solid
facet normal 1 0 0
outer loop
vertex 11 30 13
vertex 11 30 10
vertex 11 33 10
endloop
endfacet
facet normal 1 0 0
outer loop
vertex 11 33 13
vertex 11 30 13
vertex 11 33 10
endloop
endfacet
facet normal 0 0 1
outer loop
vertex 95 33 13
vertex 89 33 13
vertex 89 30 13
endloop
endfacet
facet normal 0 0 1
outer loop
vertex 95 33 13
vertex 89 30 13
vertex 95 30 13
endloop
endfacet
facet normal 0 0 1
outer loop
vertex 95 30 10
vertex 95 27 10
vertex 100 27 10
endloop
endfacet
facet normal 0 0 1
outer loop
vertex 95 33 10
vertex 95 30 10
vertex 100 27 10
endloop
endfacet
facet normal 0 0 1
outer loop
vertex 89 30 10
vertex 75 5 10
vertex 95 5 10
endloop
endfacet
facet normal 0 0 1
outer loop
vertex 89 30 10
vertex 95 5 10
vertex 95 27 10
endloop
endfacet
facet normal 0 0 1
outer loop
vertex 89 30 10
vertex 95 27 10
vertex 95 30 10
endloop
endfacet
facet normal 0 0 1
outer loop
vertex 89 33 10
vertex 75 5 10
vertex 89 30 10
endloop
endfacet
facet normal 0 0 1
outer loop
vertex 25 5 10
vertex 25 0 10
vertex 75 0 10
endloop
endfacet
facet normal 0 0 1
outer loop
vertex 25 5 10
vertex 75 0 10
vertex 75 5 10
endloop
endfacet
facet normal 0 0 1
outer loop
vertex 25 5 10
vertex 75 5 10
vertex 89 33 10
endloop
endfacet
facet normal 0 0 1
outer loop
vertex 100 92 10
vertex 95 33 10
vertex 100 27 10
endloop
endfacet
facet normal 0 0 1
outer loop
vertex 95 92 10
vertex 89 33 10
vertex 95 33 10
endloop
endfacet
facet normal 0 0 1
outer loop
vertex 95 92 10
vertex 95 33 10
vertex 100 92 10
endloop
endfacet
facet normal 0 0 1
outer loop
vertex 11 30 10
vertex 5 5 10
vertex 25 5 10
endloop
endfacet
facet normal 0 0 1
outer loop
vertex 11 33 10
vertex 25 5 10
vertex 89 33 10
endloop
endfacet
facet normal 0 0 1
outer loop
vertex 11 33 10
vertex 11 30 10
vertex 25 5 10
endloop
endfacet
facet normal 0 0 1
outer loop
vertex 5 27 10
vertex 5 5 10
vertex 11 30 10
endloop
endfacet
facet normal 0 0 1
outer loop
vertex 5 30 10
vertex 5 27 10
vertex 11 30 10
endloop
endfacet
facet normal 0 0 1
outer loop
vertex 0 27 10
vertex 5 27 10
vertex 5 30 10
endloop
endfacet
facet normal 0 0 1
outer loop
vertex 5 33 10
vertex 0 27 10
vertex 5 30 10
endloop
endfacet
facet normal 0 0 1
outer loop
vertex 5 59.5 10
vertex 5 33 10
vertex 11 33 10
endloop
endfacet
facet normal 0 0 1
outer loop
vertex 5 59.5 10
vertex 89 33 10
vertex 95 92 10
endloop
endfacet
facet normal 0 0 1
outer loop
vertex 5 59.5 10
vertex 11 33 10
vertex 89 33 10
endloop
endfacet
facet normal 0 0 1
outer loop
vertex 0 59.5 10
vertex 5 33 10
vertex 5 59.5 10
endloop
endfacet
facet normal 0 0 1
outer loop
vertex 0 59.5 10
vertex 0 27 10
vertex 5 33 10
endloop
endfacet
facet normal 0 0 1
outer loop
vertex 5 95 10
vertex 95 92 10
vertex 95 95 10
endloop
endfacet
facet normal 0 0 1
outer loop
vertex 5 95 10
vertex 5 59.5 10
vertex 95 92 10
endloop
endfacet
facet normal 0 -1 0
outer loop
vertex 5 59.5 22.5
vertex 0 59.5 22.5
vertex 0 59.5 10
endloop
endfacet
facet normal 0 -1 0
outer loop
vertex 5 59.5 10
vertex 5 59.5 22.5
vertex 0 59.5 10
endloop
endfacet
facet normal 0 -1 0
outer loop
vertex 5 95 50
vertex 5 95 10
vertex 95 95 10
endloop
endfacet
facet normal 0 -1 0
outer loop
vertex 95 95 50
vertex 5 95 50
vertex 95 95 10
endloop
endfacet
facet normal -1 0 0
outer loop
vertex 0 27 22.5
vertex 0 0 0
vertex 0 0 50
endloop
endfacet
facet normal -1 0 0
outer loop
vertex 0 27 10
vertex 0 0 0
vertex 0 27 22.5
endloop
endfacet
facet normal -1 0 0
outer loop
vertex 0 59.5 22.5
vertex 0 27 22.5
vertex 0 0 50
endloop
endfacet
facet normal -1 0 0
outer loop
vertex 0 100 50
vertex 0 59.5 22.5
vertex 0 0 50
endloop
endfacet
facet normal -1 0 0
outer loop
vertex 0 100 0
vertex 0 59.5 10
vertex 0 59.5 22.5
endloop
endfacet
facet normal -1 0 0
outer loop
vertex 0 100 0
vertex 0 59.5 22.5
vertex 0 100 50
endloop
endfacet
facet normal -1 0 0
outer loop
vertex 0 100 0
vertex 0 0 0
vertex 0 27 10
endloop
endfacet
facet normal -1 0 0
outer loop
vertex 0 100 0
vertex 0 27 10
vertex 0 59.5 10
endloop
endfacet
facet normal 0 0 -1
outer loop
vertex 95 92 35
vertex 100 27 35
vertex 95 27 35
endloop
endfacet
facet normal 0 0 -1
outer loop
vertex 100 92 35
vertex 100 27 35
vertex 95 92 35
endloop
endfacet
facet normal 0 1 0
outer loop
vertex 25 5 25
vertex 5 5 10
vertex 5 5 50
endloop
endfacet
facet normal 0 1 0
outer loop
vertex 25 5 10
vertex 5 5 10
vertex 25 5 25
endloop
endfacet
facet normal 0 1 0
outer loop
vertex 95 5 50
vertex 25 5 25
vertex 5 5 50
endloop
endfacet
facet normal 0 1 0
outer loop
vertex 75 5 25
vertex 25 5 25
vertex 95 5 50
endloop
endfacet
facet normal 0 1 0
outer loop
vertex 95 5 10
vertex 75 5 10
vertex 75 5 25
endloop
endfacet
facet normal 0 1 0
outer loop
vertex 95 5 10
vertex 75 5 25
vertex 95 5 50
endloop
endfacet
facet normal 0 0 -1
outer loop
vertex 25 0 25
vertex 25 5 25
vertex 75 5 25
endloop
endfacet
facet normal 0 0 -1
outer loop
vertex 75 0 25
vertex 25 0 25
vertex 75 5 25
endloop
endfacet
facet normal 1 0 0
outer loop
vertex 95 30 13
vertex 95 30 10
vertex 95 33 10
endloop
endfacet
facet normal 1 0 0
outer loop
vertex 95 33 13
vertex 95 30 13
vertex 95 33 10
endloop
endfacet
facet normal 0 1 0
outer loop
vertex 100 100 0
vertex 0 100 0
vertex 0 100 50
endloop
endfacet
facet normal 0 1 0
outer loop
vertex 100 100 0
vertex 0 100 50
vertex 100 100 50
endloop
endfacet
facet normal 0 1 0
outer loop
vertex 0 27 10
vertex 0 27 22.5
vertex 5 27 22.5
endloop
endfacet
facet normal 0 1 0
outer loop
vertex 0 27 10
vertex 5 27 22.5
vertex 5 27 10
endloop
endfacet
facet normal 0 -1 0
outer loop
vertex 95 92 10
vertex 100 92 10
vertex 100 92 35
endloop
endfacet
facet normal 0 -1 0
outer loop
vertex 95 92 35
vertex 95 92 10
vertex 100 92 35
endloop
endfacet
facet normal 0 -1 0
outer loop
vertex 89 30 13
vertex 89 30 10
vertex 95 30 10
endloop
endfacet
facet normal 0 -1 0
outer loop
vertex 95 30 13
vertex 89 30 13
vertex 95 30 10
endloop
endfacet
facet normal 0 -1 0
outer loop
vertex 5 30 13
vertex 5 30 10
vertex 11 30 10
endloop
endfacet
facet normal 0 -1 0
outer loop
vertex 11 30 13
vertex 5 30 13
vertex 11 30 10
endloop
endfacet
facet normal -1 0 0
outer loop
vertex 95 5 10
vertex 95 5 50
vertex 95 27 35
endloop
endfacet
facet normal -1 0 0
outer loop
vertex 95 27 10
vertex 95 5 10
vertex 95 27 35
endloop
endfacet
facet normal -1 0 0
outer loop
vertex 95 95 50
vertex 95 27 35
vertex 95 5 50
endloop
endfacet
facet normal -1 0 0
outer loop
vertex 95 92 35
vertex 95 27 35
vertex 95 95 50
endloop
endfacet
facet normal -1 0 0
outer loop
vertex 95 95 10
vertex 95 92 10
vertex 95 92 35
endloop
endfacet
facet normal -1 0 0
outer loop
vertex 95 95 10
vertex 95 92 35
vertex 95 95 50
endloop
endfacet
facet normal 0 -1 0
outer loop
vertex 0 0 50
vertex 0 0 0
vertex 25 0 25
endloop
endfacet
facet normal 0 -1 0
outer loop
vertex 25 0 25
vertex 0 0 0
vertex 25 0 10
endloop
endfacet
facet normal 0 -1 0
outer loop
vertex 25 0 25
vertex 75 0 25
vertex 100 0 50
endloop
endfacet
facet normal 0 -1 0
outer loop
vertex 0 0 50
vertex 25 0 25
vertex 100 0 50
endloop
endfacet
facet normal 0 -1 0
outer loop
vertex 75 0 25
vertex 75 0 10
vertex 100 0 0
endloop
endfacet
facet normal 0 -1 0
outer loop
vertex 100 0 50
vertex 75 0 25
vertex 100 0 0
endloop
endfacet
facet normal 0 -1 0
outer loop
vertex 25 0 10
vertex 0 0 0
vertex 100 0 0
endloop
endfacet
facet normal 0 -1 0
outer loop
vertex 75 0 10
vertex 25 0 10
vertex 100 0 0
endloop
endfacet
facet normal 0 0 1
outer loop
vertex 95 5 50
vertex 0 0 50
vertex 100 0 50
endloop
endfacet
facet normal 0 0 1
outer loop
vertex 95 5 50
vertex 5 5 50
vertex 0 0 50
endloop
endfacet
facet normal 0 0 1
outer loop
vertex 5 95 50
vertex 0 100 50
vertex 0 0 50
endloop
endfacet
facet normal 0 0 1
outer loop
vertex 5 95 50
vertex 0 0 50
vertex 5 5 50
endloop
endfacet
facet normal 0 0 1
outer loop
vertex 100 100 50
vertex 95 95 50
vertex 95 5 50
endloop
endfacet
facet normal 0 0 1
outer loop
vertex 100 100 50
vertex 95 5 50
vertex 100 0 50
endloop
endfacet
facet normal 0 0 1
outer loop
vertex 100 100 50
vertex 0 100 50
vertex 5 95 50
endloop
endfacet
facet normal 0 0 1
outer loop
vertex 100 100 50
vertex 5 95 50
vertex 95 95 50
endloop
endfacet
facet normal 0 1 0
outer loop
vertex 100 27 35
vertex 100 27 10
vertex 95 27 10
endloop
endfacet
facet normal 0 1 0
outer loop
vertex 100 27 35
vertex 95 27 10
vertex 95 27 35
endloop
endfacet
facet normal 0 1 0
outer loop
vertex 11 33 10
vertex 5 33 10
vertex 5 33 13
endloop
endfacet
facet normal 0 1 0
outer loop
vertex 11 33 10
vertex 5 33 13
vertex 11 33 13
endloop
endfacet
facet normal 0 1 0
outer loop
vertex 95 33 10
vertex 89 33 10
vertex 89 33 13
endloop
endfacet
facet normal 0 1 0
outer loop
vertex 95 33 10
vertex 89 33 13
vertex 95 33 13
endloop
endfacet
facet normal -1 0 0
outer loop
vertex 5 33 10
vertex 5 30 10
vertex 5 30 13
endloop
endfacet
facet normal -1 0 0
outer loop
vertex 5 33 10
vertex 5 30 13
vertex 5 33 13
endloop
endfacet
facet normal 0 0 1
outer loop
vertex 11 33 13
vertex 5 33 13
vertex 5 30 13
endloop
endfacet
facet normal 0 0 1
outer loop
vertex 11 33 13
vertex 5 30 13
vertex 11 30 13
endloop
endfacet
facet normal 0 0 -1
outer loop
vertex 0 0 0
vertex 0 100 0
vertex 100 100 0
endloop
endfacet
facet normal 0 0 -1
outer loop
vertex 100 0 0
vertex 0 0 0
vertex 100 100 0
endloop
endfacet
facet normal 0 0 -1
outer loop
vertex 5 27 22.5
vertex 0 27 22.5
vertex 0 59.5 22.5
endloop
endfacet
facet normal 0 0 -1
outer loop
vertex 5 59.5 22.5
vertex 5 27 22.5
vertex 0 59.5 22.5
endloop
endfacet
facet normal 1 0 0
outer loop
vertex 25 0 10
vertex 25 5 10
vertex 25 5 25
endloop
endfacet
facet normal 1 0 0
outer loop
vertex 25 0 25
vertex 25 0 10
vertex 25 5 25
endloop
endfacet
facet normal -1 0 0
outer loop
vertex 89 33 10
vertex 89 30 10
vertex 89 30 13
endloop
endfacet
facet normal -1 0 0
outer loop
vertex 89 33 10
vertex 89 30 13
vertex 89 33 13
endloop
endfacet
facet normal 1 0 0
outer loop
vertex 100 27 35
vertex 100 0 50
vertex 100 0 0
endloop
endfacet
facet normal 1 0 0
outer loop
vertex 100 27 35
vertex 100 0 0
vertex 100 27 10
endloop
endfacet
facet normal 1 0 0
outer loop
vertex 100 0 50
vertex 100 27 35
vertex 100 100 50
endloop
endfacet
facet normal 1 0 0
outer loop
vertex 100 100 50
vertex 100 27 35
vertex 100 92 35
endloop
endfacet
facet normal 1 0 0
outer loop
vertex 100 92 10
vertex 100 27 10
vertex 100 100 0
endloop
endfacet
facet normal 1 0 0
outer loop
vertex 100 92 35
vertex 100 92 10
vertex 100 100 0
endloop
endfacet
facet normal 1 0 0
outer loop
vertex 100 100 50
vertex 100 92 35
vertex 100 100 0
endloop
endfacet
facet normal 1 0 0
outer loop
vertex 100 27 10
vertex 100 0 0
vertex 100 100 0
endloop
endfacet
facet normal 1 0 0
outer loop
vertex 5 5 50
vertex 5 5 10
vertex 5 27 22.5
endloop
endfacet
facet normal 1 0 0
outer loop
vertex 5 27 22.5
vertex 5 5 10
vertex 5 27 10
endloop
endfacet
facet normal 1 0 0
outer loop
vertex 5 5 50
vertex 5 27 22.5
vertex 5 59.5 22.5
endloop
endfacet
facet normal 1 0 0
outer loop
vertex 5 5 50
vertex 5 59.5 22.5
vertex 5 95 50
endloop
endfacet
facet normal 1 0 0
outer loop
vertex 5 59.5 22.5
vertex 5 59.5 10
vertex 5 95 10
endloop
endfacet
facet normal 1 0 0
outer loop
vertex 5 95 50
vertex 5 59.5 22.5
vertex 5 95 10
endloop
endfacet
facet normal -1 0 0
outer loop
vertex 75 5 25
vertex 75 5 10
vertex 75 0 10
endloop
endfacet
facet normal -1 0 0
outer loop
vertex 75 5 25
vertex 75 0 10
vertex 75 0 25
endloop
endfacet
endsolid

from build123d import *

# Parameters (mm, degrees)
SKETCH1_W               = 100
SKETCH1_H               = 100
BOSS_EXTRUDE1_DEPTH     = 50
SHELL1_T                = -10
CUT_EXTRUDE1_DEPTH      = 151
CUT_EXTRUDE1_DEPTH_BACK = 10
SKETCH2_W               = 50
SKETCH2_H               = 15
SKETCH3_W               = 25
SKETCH3_H               = 65
CUT_EXTRUDE2_DEPTH      = 10
SKETCH4_W               = 12.5
SKETCH4_H               = 32.5
CUT_EXTRUDE3_DEPTH      = 10
CUT_EXTRUDE4_START      = -40
SKETCH5_W               = 90
SKETCH5_H               = 90
CUT_EXTRUDE4_DEPTH      = 40
SKETCH6_W               = 6
SKETCH6_H               = 3
BOSS_EXTRUDE2_DEPTH     = 3


with BuildPart() as part:
    # Sketch1 → Boss-Extrude1 (new body)
    with BuildSketch(Plane.XY):
        with Locations((50, 50)):
            Rectangle(SKETCH1_W, SKETCH1_H)
    extrude(amount=BOSS_EXTRUDE1_DEPTH)

    # Shell1
    shell1_openings = [part.faces().sort_by_distance(p)[0] for p in [
        (50, 50, 50),
    ]]
    offset(amount=SHELL1_T, openings=shell1_openings, kind=Kind.INTERSECTION)

    # Sketch2 → Cut-Extrude1 (cut, two sides: drawn at the far end of the back side and taken through both)
    with BuildSketch(Plane.XZ.offset(-CUT_EXTRUDE1_DEPTH_BACK)):
        with Locations((50, 17.5)):
            Rectangle(SKETCH2_W, SKETCH2_H)
    extrude(amount=CUT_EXTRUDE1_DEPTH + CUT_EXTRUDE1_DEPTH_BACK, mode=Mode.SUBTRACT)

    # Sketch3 → Cut-Extrude2 (cut)
    with BuildSketch(Plane.ZY.offset(-100)):
        with Locations((22.5, 59.5)):
            Rectangle(SKETCH3_W, SKETCH3_H)
    extrude(amount=CUT_EXTRUDE2_DEPTH, mode=Mode.SUBTRACT)

    # Sketch4 → Cut-Extrude3 (cut)
    with BuildSketch(Plane(origin=(0, 0, 0), x_dir=(0, 0, -1), z_dir=(1, 0, 0))):
        with Locations((-16.25, 43.25)):
            Rectangle(SKETCH4_W, SKETCH4_H)
    extrude(amount=CUT_EXTRUDE3_DEPTH, mode=Mode.SUBTRACT)

    # Sketch5 → Cut-Extrude4 (cut)
    with BuildSketch(Plane.XY.offset(50).offset(CUT_EXTRUDE4_START)):
        with Locations((50, 50)):
            Rectangle(SKETCH5_W, SKETCH5_H)
    extrude(amount=CUT_EXTRUDE4_DEPTH, mode=Mode.SUBTRACT)

    # Sketch6 → Boss-Extrude2 (add)
    with BuildSketch(Plane.XY.offset(10)):
        with Locations((8, 31.5)):
            Rectangle(SKETCH6_W, SKETCH6_H)
        with Locations((92, 31.5)):
            Rectangle(SKETCH6_W, SKETCH6_H)
    extrude(amount=BOSS_EXTRUDE2_DEPTH)


solid = part.part
